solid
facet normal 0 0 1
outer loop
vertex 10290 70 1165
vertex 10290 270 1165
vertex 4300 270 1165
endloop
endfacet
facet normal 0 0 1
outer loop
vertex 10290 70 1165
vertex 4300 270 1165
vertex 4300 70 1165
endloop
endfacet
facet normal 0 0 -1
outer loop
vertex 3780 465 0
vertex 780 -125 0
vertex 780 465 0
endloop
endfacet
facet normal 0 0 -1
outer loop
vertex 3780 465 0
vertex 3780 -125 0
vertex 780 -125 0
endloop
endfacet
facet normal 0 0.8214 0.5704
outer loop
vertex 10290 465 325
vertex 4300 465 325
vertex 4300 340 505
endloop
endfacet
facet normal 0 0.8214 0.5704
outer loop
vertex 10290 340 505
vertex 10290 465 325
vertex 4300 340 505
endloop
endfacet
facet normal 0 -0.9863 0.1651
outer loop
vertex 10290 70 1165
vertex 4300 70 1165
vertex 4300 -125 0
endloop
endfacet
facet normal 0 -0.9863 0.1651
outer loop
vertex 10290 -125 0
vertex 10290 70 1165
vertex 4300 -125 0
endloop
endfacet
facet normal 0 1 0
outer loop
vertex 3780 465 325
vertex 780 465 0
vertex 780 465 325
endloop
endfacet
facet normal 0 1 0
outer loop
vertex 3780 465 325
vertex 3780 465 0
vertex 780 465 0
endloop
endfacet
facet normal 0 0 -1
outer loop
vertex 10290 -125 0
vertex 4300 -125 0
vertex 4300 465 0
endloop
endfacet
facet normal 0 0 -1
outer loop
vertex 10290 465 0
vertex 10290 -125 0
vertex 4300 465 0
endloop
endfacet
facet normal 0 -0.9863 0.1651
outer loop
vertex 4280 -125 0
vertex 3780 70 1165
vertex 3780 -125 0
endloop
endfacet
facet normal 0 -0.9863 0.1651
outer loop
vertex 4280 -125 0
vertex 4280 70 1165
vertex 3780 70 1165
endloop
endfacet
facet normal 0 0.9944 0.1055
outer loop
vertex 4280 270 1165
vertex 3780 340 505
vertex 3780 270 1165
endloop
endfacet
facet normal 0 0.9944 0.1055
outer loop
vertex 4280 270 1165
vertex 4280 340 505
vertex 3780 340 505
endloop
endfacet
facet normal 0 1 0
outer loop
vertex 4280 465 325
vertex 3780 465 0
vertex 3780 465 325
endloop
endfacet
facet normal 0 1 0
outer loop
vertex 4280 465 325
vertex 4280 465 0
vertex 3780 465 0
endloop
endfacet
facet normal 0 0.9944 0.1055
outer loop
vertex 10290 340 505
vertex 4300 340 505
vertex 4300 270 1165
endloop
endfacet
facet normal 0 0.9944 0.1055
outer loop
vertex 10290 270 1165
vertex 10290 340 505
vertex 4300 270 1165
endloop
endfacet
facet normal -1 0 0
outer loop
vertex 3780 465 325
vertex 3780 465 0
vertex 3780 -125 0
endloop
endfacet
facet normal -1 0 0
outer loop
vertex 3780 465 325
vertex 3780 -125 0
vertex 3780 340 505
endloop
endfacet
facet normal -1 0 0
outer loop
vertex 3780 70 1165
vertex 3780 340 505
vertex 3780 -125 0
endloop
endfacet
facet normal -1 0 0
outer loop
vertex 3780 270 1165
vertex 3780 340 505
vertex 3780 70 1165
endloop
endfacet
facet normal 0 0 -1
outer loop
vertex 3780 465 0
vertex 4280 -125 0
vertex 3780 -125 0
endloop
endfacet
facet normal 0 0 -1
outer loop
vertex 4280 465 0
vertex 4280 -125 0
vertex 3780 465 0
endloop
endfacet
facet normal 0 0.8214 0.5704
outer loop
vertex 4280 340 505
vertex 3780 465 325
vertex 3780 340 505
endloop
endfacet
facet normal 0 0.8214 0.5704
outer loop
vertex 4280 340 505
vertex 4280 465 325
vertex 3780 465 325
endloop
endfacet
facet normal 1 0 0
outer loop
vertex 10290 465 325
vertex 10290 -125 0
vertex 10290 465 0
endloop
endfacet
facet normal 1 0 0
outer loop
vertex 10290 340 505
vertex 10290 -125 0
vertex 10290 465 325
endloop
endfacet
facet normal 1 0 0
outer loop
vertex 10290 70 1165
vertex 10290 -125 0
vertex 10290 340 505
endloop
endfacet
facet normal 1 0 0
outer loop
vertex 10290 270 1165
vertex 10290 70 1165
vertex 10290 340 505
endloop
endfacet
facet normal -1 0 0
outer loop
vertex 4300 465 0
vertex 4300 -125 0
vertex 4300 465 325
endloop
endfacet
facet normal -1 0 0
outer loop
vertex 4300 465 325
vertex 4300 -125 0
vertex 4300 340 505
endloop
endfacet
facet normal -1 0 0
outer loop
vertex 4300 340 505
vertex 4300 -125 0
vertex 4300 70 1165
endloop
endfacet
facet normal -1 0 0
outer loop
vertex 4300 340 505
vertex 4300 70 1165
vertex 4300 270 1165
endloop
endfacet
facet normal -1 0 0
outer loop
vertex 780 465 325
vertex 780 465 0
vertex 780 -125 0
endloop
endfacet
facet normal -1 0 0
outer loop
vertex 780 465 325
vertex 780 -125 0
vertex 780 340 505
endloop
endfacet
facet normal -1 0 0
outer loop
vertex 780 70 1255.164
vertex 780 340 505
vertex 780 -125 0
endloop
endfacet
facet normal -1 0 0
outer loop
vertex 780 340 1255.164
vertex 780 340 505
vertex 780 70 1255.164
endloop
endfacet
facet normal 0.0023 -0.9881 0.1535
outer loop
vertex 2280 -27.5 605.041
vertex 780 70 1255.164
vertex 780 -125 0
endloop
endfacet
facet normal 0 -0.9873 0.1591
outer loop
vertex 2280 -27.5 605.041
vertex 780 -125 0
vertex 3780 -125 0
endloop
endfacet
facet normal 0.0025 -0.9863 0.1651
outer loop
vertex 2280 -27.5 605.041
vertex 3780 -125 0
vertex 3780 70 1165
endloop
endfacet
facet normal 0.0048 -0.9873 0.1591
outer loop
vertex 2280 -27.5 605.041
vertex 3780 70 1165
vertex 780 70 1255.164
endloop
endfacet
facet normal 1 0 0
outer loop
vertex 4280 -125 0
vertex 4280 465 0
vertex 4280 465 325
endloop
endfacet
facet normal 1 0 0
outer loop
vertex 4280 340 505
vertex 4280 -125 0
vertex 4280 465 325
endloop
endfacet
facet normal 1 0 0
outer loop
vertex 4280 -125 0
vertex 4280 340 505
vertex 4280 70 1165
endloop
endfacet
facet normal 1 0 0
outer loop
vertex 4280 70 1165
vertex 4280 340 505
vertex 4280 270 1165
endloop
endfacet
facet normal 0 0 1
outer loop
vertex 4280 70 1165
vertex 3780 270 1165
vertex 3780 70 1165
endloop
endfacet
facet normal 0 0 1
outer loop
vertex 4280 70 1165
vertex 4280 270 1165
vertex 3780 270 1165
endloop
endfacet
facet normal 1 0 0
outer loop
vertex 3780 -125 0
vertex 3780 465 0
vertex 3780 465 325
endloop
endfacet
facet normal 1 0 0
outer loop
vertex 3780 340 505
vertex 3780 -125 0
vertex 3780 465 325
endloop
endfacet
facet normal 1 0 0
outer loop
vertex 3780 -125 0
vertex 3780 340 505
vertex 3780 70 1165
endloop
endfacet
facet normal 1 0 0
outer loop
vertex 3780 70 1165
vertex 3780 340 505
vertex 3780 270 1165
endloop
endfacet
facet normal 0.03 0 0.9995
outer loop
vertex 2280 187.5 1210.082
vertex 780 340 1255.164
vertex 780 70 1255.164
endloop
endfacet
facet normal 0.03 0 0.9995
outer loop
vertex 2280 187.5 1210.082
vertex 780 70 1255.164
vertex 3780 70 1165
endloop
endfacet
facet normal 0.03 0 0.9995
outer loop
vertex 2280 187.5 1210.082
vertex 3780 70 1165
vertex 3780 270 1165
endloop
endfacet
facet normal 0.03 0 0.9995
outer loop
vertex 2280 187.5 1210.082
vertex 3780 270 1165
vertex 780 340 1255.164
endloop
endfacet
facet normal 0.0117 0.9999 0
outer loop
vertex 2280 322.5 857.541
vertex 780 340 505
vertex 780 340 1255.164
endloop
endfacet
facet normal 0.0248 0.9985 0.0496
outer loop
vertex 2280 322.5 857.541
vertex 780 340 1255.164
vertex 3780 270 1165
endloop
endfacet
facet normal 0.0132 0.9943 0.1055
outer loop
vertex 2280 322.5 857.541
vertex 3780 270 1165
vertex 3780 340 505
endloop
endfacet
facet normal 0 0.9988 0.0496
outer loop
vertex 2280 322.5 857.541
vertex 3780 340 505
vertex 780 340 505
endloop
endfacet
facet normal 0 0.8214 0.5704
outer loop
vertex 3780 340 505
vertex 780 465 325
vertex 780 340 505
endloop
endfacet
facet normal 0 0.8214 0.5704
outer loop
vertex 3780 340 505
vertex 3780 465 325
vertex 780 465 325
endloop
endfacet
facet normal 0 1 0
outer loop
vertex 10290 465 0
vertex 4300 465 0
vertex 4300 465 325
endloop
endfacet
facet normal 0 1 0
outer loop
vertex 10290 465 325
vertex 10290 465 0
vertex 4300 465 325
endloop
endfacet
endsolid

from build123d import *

# Parameters (mm, degrees)
F11_DEPTH = 5990


with BuildPart() as f6:
    # F5 (on offset) → F6 section 0
    with BuildSketch(Plane.YZ.offset(3780)):
        Polygon((-125, 0), (465, 0), (465, 325), (340, 505), (270, 1165), (70, 1165), align=None)
    # F4 (on offset) → F6 section 1
    with BuildSketch(Plane.YZ.offset(4280)):
        Polygon((-125, 0), (465, 0), (465, 325), (340, 505), (270, 1165), (70, 1165), align=None)
    loft()


with BuildPart() as f8:
    # F7 (on offset) → F8 section 0
    with BuildSketch(Plane.YZ.offset(780)):
        Polygon((-125, 0), (465, 0), (465, 325), (340, 505), (340, 1255.1641464233), (70, 1255.1641464233), align=None)
    # F5 (on offset) → F8 section 1
    with BuildSketch(Plane.YZ.offset(3780)):
        Polygon((-125, 0), (465, 0), (465, 325), (340, 505), (270, 1165), (70, 1165), align=None)
    loft()


with BuildPart() as f11:
    # F10 (on offset) → F11 (new body)
    with BuildSketch(Plane.YZ.offset(4300)):
        Polygon((-125, 0), (465, 0), (465, 325), (340, 505), (270, 1165), (70, 1165), align=None)
    extrude(amount=F11_DEPTH)


solid = Compound([f6.part, f8.part, f11.part])
